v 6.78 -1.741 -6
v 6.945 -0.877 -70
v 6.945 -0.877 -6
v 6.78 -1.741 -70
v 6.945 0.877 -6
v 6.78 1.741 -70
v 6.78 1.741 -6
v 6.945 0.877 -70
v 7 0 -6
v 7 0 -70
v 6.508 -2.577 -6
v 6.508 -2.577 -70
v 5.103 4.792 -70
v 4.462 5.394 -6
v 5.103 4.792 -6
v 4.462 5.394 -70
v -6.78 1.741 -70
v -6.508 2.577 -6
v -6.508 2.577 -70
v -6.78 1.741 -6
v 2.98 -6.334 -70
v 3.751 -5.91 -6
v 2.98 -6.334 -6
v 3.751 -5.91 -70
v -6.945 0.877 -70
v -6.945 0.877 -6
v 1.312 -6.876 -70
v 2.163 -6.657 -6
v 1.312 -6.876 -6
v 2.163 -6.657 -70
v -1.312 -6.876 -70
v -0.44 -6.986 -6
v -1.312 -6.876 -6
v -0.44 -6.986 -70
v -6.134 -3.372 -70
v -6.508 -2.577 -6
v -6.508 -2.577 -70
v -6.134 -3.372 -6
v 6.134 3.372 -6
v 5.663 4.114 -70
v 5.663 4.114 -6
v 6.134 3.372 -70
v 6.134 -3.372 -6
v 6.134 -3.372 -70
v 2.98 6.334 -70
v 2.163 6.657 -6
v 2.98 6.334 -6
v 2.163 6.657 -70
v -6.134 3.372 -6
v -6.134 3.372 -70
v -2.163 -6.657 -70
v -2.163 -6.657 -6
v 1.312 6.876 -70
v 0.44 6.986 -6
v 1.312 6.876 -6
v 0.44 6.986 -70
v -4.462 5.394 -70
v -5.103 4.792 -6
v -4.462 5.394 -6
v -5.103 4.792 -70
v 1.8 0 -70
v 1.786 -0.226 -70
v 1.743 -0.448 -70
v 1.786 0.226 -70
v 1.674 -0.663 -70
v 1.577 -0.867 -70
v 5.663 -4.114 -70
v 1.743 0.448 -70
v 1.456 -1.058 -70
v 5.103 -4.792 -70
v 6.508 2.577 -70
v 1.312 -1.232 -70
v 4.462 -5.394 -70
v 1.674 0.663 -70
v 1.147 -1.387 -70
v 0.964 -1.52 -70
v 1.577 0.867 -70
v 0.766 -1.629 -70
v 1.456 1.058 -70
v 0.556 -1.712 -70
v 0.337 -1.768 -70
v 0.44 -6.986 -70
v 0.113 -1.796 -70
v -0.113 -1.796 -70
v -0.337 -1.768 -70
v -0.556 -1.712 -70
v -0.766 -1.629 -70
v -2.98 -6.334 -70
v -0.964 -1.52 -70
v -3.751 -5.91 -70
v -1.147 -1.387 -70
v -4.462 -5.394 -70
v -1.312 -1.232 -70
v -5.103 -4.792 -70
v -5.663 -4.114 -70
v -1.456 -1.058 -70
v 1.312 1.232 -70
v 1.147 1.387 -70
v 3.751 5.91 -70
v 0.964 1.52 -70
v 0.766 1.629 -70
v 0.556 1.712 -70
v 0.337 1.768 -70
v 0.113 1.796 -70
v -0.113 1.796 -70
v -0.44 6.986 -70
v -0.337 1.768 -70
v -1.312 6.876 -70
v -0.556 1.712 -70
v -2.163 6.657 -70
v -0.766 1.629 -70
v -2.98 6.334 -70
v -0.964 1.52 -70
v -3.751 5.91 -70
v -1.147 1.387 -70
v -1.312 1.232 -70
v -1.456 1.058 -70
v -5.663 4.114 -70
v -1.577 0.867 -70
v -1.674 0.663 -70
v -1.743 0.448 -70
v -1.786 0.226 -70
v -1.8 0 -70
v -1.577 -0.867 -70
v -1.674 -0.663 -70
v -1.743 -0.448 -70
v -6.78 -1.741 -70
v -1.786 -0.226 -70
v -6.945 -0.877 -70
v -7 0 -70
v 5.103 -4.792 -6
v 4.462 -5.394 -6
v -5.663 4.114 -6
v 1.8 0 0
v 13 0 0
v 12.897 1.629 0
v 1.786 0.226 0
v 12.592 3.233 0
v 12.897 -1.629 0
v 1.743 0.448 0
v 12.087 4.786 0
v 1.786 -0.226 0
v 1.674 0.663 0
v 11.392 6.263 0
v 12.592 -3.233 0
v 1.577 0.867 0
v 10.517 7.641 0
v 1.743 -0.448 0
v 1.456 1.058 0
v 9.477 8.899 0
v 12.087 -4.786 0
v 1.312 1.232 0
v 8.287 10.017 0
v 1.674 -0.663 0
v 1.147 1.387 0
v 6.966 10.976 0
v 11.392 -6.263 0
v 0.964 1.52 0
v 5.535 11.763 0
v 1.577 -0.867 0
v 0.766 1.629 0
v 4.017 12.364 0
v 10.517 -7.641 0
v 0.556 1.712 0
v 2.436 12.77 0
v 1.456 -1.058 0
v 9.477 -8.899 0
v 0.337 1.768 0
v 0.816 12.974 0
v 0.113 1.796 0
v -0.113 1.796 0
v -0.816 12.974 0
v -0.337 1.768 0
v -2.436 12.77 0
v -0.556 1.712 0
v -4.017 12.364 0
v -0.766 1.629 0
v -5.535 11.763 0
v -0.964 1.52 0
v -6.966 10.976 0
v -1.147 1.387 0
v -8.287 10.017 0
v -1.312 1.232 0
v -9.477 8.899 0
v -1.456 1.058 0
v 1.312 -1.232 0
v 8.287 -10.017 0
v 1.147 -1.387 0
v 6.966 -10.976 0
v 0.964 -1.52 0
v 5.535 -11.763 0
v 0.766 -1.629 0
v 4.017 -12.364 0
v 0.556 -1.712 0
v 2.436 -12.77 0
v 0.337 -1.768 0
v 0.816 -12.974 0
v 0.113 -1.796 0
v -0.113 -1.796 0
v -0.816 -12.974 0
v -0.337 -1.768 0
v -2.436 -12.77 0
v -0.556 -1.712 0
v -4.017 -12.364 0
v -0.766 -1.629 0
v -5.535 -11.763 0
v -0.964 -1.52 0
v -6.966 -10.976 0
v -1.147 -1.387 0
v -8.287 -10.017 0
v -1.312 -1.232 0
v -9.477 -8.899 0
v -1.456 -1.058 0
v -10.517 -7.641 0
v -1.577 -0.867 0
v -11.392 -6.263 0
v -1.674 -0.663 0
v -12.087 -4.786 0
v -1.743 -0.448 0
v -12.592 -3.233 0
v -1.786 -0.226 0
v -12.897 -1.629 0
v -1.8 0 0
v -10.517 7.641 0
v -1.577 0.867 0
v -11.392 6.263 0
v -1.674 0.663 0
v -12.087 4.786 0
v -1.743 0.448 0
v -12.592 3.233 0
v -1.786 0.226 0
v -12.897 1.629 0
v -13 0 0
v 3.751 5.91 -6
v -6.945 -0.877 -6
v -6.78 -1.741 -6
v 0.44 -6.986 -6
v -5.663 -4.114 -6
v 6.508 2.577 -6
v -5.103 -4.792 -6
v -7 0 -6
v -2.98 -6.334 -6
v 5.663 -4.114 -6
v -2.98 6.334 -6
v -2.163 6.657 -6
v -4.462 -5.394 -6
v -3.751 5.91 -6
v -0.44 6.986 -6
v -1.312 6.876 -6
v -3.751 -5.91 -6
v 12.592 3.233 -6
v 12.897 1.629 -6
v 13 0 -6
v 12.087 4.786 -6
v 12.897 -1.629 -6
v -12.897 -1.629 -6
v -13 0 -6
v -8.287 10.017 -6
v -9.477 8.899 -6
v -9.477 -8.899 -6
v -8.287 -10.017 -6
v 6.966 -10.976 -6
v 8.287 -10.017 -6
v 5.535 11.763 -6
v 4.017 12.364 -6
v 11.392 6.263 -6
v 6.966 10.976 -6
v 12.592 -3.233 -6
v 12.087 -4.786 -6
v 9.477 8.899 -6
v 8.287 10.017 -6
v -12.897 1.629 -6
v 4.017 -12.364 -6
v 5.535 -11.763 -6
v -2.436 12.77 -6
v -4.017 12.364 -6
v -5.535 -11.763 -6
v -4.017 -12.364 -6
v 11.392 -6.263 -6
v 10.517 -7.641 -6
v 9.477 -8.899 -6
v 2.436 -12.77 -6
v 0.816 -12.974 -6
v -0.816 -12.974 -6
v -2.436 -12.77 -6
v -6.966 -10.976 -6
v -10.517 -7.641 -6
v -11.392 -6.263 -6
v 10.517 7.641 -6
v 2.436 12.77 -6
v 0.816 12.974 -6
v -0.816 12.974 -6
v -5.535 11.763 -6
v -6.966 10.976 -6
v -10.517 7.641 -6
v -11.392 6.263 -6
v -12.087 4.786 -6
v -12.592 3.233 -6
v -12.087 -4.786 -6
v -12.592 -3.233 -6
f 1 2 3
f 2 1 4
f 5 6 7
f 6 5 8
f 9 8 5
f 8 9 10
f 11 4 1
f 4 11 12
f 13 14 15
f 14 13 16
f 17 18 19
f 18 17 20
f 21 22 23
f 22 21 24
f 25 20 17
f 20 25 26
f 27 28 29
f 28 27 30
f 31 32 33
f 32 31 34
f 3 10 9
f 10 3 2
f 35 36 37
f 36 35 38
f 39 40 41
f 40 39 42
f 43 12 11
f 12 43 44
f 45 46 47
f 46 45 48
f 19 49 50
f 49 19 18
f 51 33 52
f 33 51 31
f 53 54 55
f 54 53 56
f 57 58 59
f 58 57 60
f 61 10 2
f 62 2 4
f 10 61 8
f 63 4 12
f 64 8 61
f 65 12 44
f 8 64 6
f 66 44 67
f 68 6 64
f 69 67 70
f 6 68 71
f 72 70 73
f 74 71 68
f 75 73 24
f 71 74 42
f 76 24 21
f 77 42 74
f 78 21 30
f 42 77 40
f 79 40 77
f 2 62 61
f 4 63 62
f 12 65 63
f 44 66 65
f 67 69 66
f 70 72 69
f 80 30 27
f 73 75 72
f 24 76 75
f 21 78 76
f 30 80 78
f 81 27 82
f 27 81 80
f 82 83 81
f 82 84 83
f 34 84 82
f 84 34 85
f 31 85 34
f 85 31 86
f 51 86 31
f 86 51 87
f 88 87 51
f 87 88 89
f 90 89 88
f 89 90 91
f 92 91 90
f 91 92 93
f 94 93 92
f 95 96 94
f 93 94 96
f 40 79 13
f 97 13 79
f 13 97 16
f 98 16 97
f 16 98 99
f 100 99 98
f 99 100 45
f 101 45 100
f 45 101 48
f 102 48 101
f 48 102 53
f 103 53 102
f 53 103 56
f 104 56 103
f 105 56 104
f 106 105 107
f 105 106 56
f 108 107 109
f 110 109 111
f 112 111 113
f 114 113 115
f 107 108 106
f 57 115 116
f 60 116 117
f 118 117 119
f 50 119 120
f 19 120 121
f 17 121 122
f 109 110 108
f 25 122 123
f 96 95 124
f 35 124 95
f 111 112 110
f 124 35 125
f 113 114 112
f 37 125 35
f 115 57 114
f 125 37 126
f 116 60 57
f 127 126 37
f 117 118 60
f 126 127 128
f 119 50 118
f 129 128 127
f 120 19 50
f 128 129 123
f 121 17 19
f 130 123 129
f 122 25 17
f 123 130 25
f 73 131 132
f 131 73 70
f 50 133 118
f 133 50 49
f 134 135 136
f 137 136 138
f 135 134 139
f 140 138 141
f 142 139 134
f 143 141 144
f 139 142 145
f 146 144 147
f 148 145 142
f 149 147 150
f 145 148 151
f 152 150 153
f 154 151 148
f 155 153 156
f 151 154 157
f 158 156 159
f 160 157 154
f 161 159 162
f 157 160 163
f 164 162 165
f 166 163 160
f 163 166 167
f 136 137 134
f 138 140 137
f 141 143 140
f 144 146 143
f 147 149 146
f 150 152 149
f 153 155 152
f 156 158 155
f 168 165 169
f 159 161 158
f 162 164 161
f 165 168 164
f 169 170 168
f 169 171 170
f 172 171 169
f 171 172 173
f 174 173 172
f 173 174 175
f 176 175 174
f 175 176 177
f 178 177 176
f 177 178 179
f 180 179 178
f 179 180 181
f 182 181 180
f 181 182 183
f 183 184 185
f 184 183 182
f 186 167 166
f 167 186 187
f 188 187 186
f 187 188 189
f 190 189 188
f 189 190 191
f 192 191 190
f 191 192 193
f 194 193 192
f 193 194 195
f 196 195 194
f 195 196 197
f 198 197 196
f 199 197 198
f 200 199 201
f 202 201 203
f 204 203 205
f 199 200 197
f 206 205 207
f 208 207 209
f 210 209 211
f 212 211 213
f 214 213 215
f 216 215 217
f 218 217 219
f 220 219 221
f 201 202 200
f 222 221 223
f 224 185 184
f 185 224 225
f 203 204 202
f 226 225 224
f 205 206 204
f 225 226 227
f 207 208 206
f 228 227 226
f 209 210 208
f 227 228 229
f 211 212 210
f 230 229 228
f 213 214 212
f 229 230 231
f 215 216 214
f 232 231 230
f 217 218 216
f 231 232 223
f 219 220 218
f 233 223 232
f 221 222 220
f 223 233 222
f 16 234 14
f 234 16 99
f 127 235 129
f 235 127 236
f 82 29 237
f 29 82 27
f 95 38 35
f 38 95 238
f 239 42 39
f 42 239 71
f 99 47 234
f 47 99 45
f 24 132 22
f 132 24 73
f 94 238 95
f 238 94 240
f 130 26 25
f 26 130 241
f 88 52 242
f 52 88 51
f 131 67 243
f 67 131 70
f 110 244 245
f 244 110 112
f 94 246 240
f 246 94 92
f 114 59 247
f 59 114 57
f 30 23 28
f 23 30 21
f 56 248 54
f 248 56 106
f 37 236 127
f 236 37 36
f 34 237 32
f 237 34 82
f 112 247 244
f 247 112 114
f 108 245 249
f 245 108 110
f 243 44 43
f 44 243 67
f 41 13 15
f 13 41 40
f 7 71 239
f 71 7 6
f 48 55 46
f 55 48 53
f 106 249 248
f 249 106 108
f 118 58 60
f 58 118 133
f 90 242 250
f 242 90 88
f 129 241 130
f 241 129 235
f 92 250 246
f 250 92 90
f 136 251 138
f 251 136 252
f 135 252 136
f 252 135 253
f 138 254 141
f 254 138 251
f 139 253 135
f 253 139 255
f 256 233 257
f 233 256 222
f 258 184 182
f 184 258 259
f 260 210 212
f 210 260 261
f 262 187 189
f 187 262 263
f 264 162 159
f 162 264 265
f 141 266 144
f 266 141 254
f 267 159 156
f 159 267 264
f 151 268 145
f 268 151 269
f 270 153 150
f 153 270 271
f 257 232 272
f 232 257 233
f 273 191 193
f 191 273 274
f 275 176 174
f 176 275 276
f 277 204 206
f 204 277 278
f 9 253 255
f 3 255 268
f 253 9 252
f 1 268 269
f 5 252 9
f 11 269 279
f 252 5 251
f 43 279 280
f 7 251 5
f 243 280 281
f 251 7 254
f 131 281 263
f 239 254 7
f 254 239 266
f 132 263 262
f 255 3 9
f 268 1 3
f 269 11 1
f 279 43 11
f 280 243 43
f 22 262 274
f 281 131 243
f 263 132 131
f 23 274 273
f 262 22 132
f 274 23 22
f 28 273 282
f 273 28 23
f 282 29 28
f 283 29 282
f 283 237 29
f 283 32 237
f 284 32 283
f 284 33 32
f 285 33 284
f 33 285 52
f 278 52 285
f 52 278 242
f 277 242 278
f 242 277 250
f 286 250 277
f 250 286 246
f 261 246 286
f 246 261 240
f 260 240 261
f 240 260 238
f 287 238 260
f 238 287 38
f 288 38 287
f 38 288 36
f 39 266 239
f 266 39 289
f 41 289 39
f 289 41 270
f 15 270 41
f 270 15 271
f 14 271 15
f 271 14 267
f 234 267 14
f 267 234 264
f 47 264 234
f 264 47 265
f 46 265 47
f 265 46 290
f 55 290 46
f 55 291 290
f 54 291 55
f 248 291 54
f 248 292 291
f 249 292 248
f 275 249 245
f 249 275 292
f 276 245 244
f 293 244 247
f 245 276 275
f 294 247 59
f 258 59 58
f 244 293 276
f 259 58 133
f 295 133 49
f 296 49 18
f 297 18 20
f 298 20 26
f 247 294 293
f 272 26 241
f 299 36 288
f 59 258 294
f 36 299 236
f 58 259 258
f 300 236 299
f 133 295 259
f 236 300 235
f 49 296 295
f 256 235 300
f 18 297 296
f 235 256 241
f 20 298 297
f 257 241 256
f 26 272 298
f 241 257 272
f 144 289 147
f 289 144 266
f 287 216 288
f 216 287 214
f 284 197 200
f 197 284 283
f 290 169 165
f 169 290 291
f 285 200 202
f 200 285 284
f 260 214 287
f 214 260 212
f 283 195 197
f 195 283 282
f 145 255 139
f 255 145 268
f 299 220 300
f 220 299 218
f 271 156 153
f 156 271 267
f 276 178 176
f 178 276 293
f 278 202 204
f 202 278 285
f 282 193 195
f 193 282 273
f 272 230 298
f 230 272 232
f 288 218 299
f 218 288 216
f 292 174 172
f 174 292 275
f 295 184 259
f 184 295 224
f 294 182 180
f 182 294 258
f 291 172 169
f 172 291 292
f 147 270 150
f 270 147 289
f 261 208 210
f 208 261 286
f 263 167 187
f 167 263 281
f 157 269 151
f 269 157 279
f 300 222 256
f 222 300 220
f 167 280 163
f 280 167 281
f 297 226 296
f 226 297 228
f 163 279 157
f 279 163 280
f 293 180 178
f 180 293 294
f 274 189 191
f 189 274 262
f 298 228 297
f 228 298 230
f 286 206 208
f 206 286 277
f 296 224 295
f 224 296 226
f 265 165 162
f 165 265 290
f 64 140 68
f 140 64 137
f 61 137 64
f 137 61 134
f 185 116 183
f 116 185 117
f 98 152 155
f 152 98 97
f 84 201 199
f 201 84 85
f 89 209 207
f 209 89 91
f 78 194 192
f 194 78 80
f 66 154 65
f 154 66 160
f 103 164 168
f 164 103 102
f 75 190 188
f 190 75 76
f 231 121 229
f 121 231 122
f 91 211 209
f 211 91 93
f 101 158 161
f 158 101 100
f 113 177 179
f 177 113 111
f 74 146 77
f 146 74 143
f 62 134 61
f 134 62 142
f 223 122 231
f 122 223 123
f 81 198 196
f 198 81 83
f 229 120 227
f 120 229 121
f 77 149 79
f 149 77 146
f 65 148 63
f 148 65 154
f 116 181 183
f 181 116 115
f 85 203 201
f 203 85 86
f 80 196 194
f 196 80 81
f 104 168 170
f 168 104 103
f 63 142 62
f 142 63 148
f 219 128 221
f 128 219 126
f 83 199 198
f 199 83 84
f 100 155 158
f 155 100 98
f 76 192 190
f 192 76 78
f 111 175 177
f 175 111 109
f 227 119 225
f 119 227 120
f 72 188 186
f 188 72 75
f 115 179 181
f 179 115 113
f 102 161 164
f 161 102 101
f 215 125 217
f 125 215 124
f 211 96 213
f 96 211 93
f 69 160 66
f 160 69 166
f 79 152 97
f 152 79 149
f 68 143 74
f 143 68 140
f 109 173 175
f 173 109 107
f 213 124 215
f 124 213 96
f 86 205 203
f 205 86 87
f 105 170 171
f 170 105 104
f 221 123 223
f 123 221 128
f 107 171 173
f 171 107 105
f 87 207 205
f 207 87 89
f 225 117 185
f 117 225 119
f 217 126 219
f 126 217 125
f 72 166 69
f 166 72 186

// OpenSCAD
$fn = 50;


difference() {
	union() {
		translate(v = [0, 0, -70.0000000000]) {
			cylinder(h = 70, r = 7.0000000000);
		}
		translate(v = [0, 0, -6.0000000000]) {
			cylinder(h = 6, r = 13.0000000000);
		}
	}
	union() {
		#translate(v = [0, 0, -70]) {
			cylinder(h = 70, r = 1.8000000000);
		}
	}
}
